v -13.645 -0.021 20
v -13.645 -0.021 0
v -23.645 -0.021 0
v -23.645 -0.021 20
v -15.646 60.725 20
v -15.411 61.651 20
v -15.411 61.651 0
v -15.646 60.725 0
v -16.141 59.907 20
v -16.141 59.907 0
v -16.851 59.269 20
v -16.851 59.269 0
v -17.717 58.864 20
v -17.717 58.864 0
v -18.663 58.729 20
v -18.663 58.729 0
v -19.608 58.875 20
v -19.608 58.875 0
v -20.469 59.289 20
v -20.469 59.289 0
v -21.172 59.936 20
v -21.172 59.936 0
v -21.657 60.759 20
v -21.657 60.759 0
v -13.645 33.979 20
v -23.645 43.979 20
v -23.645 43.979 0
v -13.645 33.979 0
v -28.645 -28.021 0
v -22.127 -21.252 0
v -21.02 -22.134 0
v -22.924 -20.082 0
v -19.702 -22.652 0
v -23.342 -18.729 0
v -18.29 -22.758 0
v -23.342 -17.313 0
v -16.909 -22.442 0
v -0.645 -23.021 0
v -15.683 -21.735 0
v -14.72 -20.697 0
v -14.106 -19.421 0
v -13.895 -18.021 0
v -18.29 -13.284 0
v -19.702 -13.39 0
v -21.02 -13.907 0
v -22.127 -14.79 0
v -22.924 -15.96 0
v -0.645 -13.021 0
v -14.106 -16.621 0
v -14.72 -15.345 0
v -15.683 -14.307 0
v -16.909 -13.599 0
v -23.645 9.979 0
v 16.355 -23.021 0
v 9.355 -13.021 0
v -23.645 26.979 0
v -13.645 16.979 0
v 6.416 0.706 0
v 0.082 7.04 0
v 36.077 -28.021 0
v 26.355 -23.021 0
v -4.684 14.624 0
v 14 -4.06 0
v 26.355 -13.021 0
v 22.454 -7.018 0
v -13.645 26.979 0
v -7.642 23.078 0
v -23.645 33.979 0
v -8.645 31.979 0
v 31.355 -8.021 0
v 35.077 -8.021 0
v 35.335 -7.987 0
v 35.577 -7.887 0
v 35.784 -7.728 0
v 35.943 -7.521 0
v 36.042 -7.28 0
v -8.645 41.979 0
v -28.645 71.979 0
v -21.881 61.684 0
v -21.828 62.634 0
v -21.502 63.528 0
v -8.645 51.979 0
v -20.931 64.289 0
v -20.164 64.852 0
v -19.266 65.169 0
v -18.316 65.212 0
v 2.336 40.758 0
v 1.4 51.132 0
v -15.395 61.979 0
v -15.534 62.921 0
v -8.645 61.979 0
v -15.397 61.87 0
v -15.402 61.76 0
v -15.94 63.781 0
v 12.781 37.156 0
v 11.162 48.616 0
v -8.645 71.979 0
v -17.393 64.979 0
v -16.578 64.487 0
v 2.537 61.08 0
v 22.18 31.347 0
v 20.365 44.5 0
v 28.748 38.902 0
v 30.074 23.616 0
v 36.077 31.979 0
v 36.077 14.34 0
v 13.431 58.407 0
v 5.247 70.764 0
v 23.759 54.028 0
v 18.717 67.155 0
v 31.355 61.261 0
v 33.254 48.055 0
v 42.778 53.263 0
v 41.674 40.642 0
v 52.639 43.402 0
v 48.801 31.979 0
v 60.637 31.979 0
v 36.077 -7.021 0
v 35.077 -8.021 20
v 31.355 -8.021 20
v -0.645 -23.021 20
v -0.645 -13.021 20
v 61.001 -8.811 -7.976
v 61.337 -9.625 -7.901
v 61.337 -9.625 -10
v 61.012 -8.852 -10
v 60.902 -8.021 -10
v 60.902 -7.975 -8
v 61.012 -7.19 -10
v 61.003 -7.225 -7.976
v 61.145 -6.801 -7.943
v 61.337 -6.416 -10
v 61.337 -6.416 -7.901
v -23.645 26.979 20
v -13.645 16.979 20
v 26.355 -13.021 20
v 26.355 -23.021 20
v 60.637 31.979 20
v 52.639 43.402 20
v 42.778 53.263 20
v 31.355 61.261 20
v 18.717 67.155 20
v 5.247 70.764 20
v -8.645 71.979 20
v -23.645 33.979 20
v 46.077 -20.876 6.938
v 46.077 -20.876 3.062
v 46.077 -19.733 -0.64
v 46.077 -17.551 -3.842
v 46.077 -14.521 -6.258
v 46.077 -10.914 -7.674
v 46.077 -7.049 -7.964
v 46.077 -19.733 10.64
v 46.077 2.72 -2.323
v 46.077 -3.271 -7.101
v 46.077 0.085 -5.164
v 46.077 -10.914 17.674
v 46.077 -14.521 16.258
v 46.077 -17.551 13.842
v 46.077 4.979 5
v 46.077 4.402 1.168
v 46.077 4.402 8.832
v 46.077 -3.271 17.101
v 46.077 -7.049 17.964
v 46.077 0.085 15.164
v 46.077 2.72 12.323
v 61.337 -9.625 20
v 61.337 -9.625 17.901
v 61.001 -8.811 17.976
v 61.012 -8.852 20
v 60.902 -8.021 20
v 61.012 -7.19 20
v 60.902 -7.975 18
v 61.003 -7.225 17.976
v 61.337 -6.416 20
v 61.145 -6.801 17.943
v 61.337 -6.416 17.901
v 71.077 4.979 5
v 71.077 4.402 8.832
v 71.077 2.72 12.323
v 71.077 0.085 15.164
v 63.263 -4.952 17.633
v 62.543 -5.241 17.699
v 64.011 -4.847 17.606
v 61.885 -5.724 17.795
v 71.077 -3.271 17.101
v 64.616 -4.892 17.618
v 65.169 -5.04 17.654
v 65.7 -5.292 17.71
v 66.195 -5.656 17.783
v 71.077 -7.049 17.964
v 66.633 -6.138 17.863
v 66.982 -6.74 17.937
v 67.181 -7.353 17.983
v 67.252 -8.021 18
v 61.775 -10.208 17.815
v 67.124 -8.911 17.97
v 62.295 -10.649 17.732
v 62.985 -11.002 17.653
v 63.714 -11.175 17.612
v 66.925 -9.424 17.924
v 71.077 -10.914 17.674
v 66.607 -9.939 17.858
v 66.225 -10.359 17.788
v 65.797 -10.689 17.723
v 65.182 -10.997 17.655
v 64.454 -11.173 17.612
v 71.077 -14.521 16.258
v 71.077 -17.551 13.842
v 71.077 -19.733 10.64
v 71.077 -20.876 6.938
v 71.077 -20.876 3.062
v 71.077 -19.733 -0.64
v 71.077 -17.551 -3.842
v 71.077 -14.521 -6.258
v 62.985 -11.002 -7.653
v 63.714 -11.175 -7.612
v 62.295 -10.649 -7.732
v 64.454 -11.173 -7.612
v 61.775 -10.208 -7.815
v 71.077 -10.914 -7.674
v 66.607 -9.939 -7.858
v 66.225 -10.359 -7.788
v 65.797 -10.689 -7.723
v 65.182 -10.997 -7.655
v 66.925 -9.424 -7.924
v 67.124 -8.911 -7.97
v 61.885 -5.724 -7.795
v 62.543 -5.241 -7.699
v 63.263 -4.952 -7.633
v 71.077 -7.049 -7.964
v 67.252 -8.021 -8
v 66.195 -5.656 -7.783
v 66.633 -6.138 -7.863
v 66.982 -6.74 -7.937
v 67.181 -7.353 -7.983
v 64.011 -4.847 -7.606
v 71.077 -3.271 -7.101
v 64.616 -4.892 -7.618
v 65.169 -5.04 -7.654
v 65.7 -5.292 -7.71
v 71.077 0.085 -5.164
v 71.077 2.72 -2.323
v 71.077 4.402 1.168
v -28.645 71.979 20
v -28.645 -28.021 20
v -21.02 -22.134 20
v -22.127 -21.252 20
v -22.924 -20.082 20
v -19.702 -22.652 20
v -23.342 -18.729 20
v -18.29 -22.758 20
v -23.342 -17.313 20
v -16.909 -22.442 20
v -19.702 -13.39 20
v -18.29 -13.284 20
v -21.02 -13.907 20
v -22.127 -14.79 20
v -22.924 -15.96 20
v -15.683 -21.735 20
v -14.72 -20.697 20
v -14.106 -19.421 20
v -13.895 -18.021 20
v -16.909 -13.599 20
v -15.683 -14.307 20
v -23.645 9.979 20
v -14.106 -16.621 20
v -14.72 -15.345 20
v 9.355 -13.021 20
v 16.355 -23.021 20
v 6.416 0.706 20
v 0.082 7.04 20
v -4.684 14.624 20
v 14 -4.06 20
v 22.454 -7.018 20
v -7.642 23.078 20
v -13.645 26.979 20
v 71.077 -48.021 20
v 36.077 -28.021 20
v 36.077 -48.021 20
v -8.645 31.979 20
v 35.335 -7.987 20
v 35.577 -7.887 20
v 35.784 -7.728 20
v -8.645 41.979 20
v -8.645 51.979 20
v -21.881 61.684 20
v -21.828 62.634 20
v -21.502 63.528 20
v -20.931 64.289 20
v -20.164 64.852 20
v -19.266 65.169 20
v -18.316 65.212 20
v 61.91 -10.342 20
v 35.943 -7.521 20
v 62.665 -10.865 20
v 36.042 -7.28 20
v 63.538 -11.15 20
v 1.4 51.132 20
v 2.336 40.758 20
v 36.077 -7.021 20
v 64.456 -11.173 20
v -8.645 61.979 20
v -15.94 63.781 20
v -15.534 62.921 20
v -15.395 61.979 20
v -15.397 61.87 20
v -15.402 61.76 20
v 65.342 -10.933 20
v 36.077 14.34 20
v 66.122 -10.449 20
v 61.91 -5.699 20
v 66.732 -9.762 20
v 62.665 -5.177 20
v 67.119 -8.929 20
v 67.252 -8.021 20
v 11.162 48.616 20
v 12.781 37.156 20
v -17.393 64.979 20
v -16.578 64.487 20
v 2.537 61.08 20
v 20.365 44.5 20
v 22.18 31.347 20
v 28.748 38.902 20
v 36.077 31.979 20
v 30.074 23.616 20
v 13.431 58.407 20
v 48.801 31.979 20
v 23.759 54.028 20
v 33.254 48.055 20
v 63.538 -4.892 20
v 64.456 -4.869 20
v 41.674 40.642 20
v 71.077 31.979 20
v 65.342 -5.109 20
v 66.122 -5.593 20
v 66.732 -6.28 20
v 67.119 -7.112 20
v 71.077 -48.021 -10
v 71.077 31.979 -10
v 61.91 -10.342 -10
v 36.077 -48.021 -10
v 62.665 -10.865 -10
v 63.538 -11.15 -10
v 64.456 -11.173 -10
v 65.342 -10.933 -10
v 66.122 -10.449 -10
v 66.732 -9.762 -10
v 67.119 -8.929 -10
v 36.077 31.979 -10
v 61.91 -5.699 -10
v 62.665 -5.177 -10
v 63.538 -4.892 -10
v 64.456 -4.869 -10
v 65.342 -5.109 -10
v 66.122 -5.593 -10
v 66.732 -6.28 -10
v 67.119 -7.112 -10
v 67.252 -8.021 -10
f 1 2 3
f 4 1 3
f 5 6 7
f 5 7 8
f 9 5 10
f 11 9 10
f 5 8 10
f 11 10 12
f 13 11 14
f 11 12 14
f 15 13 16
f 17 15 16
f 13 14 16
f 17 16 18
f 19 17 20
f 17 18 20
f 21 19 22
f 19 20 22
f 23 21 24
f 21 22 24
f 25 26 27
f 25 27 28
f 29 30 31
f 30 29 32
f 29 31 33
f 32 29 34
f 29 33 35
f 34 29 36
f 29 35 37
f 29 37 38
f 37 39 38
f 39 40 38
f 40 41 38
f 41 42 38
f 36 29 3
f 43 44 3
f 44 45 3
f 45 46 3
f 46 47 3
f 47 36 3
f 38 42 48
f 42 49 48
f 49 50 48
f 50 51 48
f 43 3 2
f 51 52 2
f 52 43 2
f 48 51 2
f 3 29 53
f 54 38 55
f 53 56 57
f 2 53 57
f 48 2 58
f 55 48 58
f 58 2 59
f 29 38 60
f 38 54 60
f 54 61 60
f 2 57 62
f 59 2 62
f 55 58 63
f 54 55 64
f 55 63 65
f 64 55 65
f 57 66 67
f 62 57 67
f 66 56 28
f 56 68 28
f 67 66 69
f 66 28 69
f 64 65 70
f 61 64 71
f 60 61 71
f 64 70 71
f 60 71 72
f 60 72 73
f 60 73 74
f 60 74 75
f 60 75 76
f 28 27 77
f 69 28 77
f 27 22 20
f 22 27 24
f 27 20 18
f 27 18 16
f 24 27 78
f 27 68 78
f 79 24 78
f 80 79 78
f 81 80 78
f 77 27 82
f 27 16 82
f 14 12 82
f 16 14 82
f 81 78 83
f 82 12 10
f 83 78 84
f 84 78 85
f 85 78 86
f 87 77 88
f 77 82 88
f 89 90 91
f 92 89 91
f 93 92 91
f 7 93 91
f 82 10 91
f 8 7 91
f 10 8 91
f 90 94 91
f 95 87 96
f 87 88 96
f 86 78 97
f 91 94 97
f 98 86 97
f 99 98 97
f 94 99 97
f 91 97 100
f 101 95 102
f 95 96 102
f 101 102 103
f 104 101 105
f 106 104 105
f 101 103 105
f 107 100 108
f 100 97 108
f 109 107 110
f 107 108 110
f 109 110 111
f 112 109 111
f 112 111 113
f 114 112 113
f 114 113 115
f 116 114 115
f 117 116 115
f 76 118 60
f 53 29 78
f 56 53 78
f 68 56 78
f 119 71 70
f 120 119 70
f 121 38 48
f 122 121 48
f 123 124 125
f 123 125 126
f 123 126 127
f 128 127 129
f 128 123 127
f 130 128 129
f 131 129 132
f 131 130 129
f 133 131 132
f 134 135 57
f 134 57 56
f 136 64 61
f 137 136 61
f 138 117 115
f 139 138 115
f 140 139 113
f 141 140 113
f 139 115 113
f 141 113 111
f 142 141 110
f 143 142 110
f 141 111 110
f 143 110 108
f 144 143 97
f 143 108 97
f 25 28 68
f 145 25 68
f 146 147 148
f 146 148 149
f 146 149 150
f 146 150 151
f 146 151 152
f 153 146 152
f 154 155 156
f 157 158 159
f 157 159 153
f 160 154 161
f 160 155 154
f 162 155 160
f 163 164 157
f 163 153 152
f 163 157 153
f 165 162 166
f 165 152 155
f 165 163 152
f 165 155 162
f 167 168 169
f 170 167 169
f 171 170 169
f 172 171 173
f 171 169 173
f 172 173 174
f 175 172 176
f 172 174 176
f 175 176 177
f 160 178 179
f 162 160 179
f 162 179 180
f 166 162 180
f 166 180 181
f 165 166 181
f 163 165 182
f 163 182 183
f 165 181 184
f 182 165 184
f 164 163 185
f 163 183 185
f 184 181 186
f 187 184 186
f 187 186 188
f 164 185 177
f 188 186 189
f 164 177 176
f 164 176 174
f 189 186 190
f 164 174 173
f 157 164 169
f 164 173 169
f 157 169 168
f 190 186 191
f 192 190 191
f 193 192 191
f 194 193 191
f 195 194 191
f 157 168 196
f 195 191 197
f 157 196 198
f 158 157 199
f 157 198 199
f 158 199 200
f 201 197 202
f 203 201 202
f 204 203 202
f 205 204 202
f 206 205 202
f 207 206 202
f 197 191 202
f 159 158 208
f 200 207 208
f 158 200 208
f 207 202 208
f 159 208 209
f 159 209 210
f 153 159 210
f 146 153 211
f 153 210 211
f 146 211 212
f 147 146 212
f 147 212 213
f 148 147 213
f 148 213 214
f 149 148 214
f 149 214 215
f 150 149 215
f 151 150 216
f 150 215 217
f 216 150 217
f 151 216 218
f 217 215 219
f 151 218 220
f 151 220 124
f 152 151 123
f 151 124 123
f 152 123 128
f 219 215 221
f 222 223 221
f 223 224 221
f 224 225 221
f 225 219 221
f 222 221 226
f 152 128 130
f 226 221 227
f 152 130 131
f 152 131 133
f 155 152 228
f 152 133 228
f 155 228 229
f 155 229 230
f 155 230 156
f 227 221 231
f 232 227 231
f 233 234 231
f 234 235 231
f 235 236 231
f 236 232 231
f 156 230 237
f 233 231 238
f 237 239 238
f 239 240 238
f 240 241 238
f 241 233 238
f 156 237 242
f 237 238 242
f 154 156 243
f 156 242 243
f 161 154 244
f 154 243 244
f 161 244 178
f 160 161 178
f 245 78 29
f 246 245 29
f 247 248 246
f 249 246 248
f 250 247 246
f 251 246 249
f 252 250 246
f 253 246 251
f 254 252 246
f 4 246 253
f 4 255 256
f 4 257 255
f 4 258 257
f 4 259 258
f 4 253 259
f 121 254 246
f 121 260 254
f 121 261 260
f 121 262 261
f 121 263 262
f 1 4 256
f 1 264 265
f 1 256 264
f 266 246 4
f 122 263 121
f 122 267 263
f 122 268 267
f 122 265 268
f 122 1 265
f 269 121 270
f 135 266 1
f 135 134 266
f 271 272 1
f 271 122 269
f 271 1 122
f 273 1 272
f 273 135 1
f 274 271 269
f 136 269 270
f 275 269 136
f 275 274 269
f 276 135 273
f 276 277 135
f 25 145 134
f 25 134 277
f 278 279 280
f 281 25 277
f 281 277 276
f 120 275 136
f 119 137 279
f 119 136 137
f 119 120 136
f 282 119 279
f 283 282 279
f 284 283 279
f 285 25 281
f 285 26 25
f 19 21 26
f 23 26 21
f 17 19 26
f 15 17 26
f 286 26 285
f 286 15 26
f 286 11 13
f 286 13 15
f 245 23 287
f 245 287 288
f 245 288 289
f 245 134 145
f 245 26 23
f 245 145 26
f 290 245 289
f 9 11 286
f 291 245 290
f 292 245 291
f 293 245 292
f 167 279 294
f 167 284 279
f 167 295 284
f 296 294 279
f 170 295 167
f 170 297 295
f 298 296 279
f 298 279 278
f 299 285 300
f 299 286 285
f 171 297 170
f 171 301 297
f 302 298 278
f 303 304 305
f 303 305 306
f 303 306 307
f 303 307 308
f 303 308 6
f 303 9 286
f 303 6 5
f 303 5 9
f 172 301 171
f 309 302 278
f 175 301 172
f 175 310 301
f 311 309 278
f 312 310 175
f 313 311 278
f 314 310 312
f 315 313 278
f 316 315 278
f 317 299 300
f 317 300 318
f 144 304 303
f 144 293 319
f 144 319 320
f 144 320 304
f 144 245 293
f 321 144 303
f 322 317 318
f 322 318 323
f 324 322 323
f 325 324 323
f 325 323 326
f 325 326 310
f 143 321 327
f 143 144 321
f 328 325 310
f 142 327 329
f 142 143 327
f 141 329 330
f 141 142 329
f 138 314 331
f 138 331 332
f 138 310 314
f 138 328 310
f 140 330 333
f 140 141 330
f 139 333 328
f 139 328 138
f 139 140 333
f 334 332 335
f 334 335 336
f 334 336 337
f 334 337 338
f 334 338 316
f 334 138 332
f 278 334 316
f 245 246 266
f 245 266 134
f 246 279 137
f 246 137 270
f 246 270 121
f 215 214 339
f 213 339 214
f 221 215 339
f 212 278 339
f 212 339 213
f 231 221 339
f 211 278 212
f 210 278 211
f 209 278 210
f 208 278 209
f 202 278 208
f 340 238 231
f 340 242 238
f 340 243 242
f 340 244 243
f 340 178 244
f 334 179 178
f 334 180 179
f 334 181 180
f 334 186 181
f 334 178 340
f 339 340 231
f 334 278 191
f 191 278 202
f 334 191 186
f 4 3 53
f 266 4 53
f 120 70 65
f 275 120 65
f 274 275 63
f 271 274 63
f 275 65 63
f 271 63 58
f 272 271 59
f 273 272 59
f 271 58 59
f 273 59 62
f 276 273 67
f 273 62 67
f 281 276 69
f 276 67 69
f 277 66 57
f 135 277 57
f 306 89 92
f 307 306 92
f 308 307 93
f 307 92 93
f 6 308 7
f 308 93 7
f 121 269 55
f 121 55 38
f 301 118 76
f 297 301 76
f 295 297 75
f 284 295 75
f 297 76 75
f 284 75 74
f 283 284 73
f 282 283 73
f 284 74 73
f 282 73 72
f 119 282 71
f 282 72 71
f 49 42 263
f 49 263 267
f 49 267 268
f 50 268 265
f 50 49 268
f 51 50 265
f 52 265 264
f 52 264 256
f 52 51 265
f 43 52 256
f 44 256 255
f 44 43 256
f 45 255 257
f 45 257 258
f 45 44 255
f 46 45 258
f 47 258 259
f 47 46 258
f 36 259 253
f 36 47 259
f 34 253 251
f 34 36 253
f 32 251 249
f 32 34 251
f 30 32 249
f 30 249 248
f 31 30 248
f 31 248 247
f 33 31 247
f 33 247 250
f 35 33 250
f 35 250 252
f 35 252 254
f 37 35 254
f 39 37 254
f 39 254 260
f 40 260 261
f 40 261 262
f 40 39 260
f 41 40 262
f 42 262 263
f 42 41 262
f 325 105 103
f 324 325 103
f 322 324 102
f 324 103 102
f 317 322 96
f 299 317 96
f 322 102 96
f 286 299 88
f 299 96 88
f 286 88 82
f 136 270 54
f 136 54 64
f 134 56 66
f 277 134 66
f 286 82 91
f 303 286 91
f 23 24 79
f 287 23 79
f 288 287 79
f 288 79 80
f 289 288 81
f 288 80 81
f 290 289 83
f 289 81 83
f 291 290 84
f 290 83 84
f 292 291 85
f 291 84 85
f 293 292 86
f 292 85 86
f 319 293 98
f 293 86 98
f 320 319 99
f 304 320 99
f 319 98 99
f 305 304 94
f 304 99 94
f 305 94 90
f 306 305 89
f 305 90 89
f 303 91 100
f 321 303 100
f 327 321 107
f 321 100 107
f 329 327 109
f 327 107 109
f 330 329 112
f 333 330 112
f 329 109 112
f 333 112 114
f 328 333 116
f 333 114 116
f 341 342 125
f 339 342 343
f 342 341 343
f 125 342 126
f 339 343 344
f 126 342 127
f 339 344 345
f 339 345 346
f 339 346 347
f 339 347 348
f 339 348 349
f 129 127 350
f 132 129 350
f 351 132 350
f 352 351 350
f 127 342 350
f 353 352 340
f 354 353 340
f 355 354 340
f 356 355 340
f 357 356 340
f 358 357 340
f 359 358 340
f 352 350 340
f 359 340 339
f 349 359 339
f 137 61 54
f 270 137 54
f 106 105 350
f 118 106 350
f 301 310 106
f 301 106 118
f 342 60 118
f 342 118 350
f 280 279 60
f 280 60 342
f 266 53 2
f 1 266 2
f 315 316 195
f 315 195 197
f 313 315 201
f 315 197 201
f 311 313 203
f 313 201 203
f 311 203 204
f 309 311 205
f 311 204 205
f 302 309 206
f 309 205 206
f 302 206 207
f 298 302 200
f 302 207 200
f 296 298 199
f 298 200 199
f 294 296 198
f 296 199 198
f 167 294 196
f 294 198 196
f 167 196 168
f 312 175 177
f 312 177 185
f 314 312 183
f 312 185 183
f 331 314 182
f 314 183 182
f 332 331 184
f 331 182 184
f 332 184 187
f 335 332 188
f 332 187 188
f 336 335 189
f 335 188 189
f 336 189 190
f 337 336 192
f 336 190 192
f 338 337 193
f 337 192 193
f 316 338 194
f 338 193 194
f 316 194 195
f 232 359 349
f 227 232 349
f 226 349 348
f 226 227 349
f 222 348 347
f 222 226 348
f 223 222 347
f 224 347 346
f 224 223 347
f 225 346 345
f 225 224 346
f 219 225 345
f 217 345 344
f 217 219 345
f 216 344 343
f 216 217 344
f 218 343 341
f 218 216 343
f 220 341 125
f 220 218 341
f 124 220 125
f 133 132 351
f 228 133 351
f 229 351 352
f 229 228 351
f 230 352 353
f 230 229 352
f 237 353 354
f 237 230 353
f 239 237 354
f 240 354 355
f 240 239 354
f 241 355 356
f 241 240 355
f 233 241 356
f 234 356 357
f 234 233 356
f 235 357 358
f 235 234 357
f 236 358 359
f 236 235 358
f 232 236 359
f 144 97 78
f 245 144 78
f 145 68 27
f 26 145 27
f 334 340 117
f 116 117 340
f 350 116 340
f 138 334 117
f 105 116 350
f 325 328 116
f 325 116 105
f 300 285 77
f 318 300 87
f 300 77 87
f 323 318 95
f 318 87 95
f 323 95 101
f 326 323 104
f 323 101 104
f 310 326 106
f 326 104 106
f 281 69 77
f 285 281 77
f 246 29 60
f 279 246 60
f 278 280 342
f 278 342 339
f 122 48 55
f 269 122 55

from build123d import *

# Parameters (mm, degrees)
F0_R     = 4.75
F1_DEPTH = 20
F2_DEPTH = 10
F3_R     = 13
F4_DEPTH = 25


with BuildPart() as f1:
    # F0 (on Top) → F1 (new body)
    with BuildSketch(Plane.XY):
        with BuildLine():
            Line((-8.6448206271, 31.9791635871), (-8.6448206271, 41.9791635871))
            ThreePointArc((-8.6448206271, 41.9791635871), (-14.4995413925, 41.6352029455), (-20.2737104175, 40.6080533775))
            Line((-20.2737104175, 40.6080533775), (-13.6448206271, 33.9791635871))
            Line((-13.6448206271, 33.9791635871), (-23.6448206271, 33.9791635871))
            Line((-23.6448206271, 33.9791635871), (-23.6448206271, 39.6761236579))
            ThreePointArc((-23.6448206271, 39.6761236579), (-26.1698127892, 38.8073030944), (-28.6448206271, 37.8049205367))
            Line((-28.6448206271, 37.8049205367), (-28.6448206271, -28.0208364129))
            Line((-28.6448206271, -28.0208364129), (-8.6448206271, -28.0208364129))
            Line((-8.6448206271, -28.0208364129), (35.0765389229, -28.0208364129))
            Line((35.0765389229, -28.0208364129), (36.0765389229, -28.0208364129))
            Line((36.0765389229, -28.0208364129), (36.0765389229, -7.0208364129))
            ThreePointArc((36.0765389229, -7.0208364129), (35.783645704, -7.7279431941), (35.0765389229, -8.0208364129))
            Line((35.0765389229, -8.0208364129), (31.3551793729, -8.0208364129))
            ThreePointArc((31.3551793729, -8.0208364129), (3.0709081254, 3.6948923396), (-8.6448206271, 31.9791635871))
        make_face()
        with Locations((-18.6448206271, -18.0208364129)):
            Circle(F0_R, mode=Mode.SUBTRACT)
        Polygon((-0.6448206271, -13.0208364129), (9.3551793729, -13.0208364129), (-0.6448206271, -23.0208364129), align=None, mode=Mode.SUBTRACT)
        Polygon((26.3551793729, -23.0208364129), (16.3551793729, -23.0208364129), (26.3551793729, -13.0208364129), align=None, mode=Mode.SUBTRACT)
        Polygon((-23.6448206271, -0.0208364129), (-23.6448206271, 9.9791635871), (-13.6448206271, -0.0208364129), align=None, mode=Mode.SUBTRACT)
        Polygon((-13.6448206271, 26.9791635871), (-13.6448206271, 16.9791635871), (-23.6448206271, 26.9791635871), align=None, mode=Mode.SUBTRACT)
        with BuildLine():
            Line((-8.6448206271, 41.9791635871), (-8.6448206271, 51.9791635871))
            ThreePointArc((-8.6448206271, 51.9791635871), (-18.7909393507, 51.1150771663), (-28.6448206271, 48.547706082))
            Line((-28.6448206271, 48.547706082), (-28.6448206271, 37.8049205367))
            ThreePointArc((-28.6448206271, 37.8049205367), (-26.1698127892, 38.8073030944), (-23.6448206271, 39.6761236579))
            Line((-23.6448206271, 39.6761236579), (-23.6448206271, 43.9791635871))
            Line((-23.6448206271, 43.9791635871), (-20.2737104175, 40.6080533775))
            ThreePointArc((-20.2737104175, 40.6080533775), (-14.4995413925, 41.6352029455), (-8.6448206271, 41.9791635871))
        make_face()
        with BuildLine():
            Line((-8.6448206271, 51.9791635871), (-8.6448206271, 61.9791635871))
            ThreePointArc((-8.6448206271, 61.9791635871), (-12.0320760881, 61.8971619884), (-15.4113955387, 61.651349314))
            ThreePointArc((-15.4113955387, 61.651349314), (-18.1852012194, 58.7618277327), (-21.6571207156, 60.7591028602))
            ThreePointArc((-21.6571207156, 60.7591028602), (-25.1727879958, 59.9999419909), (-28.6448206271, 59.0612029121))
            Line((-28.6448206271, 59.0612029121), (-28.6448206271, 48.547706082))
            ThreePointArc((-28.6448206271, 48.547706082), (-18.7909393507, 51.1150771663), (-8.6448206271, 51.9791635871))
        make_face()
        with BuildLine():
            Line((-8.6448206271, 61.9791635871), (-8.6448206271, 71.9791635871))
            ThreePointArc((-8.6448206271, 71.9791635871), (-18.7251640258, 71.3415392885), (-28.6448206271, 69.4388305112))
            Line((-28.6448206271, 69.4388305112), (-28.6448206271, 59.0612029121))
            ThreePointArc((-28.6448206271, 59.0612029121), (-25.1727879958, 59.9999419909), (-21.6571207156, 60.7591028602))
            ThreePointArc((-21.6571207156, 60.7591028602), (-19.2663207127, 65.1691851613), (-15.3948206271, 61.9791635871))
            ThreePointArc((-15.3948206271, 61.9791635871), (-15.398967, 61.8150470695), (-15.4113955387, 61.651349314))
            ThreePointArc((-15.4113955387, 61.651349314), (-12.0320760881, 61.8971619884), (-8.6448206271, 61.9791635871))
        make_face()
        with BuildLine():
            ThreePointArc((-28.6448206271, 69.4388305112), (-18.7251640258, 71.3415392885), (-8.6448206271, 71.9791635871))
            Line((-8.6448206271, 71.9791635871), (-28.6448206271, 71.9791635871))
            Line((-28.6448206271, 71.9791635871), (-28.6448206271, 69.4388305112))
        make_face()
        with BuildLine():
            ThreePointArc((60.6372116756, 31.9791635871), (31.3551793729, 61.2611958898), (-8.6448206271, 71.9791635871))
            Line((-8.6448206271, 71.9791635871), (-8.6448206271, 61.9791635871))
            ThreePointArc((-8.6448206271, 61.9791635871), (23.7588828649, 54.027531817), (48.8008058382, 31.9791635871))
            Line((48.8008058382, 31.9791635871), (60.6372116756, 31.9791635871))
        make_face()
        with BuildLine():
            ThreePointArc((36.0765389229, 31.9791635871), (15.8500768007, 46.7514193376), (-8.6448206271, 51.9791635871))
            Line((-8.6448206271, 51.9791635871), (-8.6448206271, 41.9791635871))
            ThreePointArc((-8.6448206271, 41.9791635871), (17.6417349788, 34.5117040047), (36.0765389229, 14.3398433621))
            Line((36.0765389229, 14.3398433621), (36.0765389229, 31.9791635871))
        make_face()
        with BuildLine():
            ThreePointArc((51.3551793729, -8.0208364129), (47.4055209106, 13.3884889735), (36.0765389229, 31.9791635871))
            Line((36.0765389229, 31.9791635871), (36.0765389229, 14.3398433621))
            ThreePointArc((36.0765389229, 14.3398433621), (40.0176288462, 3.4668096145), (41.3551793729, -8.0208364129))
            ThreePointArc((41.3551793729, -8.0208364129), (40.0176288462, -19.5084824403), (36.0765389229, -30.3815161879))
            Line((36.0765389229, -30.3815161879), (36.0765389229, -48.0208364129))
            ThreePointArc((36.0765389229, -48.0208364129), (47.4055209106, -29.4301617993), (51.3551793729, -8.0208364129))
        make_face()
        with BuildLine():
            ThreePointArc((61.3367884406, -6.4163451244), (57.898239576, 13.70521106), (48.8008058382, 31.9791635871))
            Line((48.8008058382, 31.9791635871), (36.0765389229, 31.9791635871))
            ThreePointArc((36.0765389229, 31.9791635871), (47.4055209106, 13.3884889735), (51.3551793729, -8.0208364129))
            ThreePointArc((51.3551793729, -8.0208364129), (47.4055209106, -29.4301617993), (36.0765389229, -48.0208364129))
            Line((36.0765389229, -48.0208364129), (48.8008058382, -48.0208364129))
            ThreePointArc((48.8008058382, -48.0208364129), (57.898239576, -29.7468838858), (61.3367884406, -9.6253277014))
            ThreePointArc((61.3367884406, -9.6253277014), (60.9015389229, -8.0208364129), (61.3367884406, -6.4163451244))
        make_face()
        with BuildLine():
            ThreePointArc((71.0765389229, -1.3496422544), (67.697860886, 15.891398518), (60.6372116756, 31.9791635871))
            Line((60.6372116756, 31.9791635871), (48.8008058382, 31.9791635871))
            ThreePointArc((48.8008058382, 31.9791635871), (57.898239576, 13.70521106), (61.3367884406, -6.4163451244))
            ThreePointArc((61.3367884406, -6.4163451244), (64.9077781239, -4.9565801588), (67.2515389229, -8.0208364129))
            ThreePointArc((67.2515389229, -8.0208364129), (64.9077781239, -11.085092667), (61.3367884406, -9.6253277014))
            ThreePointArc((61.3367884406, -9.6253277014), (57.898239576, -29.7468838858), (48.8008058382, -48.0208364129))
            Line((48.8008058382, -48.0208364129), (60.6372116756, -48.0208364129))
            ThreePointArc((60.6372116756, -48.0208364129), (67.697860886, -31.9330713438), (71.0765389229, -14.6920305714))
            Line((71.0765389229, -14.6920305714), (71.0765389229, -1.3496422544))
        make_face()
        with BuildLine():
            Line((71.0765389229, 31.9791635871), (60.6372116756, 31.9791635871))
            ThreePointArc((60.6372116756, 31.9791635871), (67.697860886, 15.891398518), (71.0765389229, -1.3496422544))
            Line((71.0765389229, -1.3496422544), (71.0765389229, 31.9791635871))
        make_face()
        with BuildLine():
            ThreePointArc((41.3551793729, -8.0208364129), (40.0176288462, 3.4668096145), (36.0765389229, 14.3398433621))
            Line((36.0765389229, 14.3398433621), (36.0765389229, -7.0208364129))
            Line((36.0765389229, -7.0208364129), (36.0765389229, -28.0208364129))
            Line((36.0765389229, -28.0208364129), (36.0765389229, -29.0208364129))
            Line((36.0765389229, -29.0208364129), (36.0765389229, -30.3815161879))
            ThreePointArc((36.0765389229, -30.3815161879), (40.0176288462, -19.5084824403), (41.3551793729, -8.0208364129))
        make_face()
        with BuildLine():
            ThreePointArc((71.0765389229, -14.6920305714), (67.697860886, -31.9330713438), (60.6372116756, -48.0208364129))
            Line((60.6372116756, -48.0208364129), (71.0765389229, -48.0208364129))
            Line((71.0765389229, -48.0208364129), (71.0765389229, -14.6920305714))
        make_face()
    extrude(amount=F1_DEPTH)

    # F0 (on Top) → F2 (join)
    with BuildSketch(Plane.XY):
        with BuildLine():
            ThreePointArc((41.3551793729, -8.0208364129), (40.0176288462, 3.4668096145), (36.0765389229, 14.3398433621))
            Line((36.0765389229, 14.3398433621), (36.0765389229, -7.0208364129))
            Line((36.0765389229, -7.0208364129), (36.0765389229, -28.0208364129))
            Line((36.0765389229, -28.0208364129), (36.0765389229, -29.0208364129))
            Line((36.0765389229, -29.0208364129), (36.0765389229, -30.3815161879))
            ThreePointArc((36.0765389229, -30.3815161879), (40.0176288462, -19.5084824403), (41.3551793729, -8.0208364129))
        make_face()
        with BuildLine():
            ThreePointArc((51.3551793729, -8.0208364129), (47.4055209106, 13.3884889735), (36.0765389229, 31.9791635871))
            Line((36.0765389229, 31.9791635871), (36.0765389229, 14.3398433621))
            ThreePointArc((36.0765389229, 14.3398433621), (40.0176288462, 3.4668096145), (41.3551793729, -8.0208364129))
            ThreePointArc((41.3551793729, -8.0208364129), (40.0176288462, -19.5084824403), (36.0765389229, -30.3815161879))
            Line((36.0765389229, -30.3815161879), (36.0765389229, -48.0208364129))
            ThreePointArc((36.0765389229, -48.0208364129), (47.4055209106, -29.4301617993), (51.3551793729, -8.0208364129))
        make_face()
        with BuildLine():
            ThreePointArc((61.3367884406, -6.4163451244), (57.898239576, 13.70521106), (48.8008058382, 31.9791635871))
            Line((48.8008058382, 31.9791635871), (36.0765389229, 31.9791635871))
            ThreePointArc((36.0765389229, 31.9791635871), (47.4055209106, 13.3884889735), (51.3551793729, -8.0208364129))
            ThreePointArc((51.3551793729, -8.0208364129), (47.4055209106, -29.4301617993), (36.0765389229, -48.0208364129))
            Line((36.0765389229, -48.0208364129), (48.8008058382, -48.0208364129))
            ThreePointArc((48.8008058382, -48.0208364129), (57.898239576, -29.7468838858), (61.3367884406, -9.6253277014))
            ThreePointArc((61.3367884406, -9.6253277014), (60.9015389229, -8.0208364129), (61.3367884406, -6.4163451244))
        make_face()
        with BuildLine():
            ThreePointArc((71.0765389229, -1.3496422544), (67.697860886, 15.891398518), (60.6372116756, 31.9791635871))
            Line((60.6372116756, 31.9791635871), (48.8008058382, 31.9791635871))
            ThreePointArc((48.8008058382, 31.9791635871), (57.898239576, 13.70521106), (61.3367884406, -6.4163451244))
            ThreePointArc((61.3367884406, -6.4163451244), (64.9077781239, -4.9565801588), (67.2515389229, -8.0208364129))
            ThreePointArc((67.2515389229, -8.0208364129), (64.9077781239, -11.085092667), (61.3367884406, -9.6253277014))
            ThreePointArc((61.3367884406, -9.6253277014), (57.898239576, -29.7468838858), (48.8008058382, -48.0208364129))
            Line((48.8008058382, -48.0208364129), (60.6372116756, -48.0208364129))
            ThreePointArc((60.6372116756, -48.0208364129), (67.697860886, -31.9330713438), (71.0765389229, -14.6920305714))
            Line((71.0765389229, -14.6920305714), (71.0765389229, -1.3496422544))
        make_face()
        with BuildLine():
            Line((71.0765389229, 31.9791635871), (60.6372116756, 31.9791635871))
            ThreePointArc((60.6372116756, 31.9791635871), (67.697860886, 15.891398518), (71.0765389229, -1.3496422544))
            Line((71.0765389229, -1.3496422544), (71.0765389229, 31.9791635871))
        make_face()
        with BuildLine():
            ThreePointArc((71.0765389229, -14.6920305714), (67.697860886, -31.9330713438), (60.6372116756, -48.0208364129))
            Line((60.6372116756, -48.0208364129), (71.0765389229, -48.0208364129))
            Line((71.0765389229, -48.0208364129), (71.0765389229, -14.6920305714))
        make_face()
    extrude(amount=-F2_DEPTH)

    # F3 (on face) → F4 (cut)
    with BuildSketch(Plane.YZ.offset(71.0765389229)):
        with Locations((-8.0208364129, 5)):
            Circle(F3_R)
    extrude(amount=-F4_DEPTH, mode=Mode.SUBTRACT)


solid = f1.part
